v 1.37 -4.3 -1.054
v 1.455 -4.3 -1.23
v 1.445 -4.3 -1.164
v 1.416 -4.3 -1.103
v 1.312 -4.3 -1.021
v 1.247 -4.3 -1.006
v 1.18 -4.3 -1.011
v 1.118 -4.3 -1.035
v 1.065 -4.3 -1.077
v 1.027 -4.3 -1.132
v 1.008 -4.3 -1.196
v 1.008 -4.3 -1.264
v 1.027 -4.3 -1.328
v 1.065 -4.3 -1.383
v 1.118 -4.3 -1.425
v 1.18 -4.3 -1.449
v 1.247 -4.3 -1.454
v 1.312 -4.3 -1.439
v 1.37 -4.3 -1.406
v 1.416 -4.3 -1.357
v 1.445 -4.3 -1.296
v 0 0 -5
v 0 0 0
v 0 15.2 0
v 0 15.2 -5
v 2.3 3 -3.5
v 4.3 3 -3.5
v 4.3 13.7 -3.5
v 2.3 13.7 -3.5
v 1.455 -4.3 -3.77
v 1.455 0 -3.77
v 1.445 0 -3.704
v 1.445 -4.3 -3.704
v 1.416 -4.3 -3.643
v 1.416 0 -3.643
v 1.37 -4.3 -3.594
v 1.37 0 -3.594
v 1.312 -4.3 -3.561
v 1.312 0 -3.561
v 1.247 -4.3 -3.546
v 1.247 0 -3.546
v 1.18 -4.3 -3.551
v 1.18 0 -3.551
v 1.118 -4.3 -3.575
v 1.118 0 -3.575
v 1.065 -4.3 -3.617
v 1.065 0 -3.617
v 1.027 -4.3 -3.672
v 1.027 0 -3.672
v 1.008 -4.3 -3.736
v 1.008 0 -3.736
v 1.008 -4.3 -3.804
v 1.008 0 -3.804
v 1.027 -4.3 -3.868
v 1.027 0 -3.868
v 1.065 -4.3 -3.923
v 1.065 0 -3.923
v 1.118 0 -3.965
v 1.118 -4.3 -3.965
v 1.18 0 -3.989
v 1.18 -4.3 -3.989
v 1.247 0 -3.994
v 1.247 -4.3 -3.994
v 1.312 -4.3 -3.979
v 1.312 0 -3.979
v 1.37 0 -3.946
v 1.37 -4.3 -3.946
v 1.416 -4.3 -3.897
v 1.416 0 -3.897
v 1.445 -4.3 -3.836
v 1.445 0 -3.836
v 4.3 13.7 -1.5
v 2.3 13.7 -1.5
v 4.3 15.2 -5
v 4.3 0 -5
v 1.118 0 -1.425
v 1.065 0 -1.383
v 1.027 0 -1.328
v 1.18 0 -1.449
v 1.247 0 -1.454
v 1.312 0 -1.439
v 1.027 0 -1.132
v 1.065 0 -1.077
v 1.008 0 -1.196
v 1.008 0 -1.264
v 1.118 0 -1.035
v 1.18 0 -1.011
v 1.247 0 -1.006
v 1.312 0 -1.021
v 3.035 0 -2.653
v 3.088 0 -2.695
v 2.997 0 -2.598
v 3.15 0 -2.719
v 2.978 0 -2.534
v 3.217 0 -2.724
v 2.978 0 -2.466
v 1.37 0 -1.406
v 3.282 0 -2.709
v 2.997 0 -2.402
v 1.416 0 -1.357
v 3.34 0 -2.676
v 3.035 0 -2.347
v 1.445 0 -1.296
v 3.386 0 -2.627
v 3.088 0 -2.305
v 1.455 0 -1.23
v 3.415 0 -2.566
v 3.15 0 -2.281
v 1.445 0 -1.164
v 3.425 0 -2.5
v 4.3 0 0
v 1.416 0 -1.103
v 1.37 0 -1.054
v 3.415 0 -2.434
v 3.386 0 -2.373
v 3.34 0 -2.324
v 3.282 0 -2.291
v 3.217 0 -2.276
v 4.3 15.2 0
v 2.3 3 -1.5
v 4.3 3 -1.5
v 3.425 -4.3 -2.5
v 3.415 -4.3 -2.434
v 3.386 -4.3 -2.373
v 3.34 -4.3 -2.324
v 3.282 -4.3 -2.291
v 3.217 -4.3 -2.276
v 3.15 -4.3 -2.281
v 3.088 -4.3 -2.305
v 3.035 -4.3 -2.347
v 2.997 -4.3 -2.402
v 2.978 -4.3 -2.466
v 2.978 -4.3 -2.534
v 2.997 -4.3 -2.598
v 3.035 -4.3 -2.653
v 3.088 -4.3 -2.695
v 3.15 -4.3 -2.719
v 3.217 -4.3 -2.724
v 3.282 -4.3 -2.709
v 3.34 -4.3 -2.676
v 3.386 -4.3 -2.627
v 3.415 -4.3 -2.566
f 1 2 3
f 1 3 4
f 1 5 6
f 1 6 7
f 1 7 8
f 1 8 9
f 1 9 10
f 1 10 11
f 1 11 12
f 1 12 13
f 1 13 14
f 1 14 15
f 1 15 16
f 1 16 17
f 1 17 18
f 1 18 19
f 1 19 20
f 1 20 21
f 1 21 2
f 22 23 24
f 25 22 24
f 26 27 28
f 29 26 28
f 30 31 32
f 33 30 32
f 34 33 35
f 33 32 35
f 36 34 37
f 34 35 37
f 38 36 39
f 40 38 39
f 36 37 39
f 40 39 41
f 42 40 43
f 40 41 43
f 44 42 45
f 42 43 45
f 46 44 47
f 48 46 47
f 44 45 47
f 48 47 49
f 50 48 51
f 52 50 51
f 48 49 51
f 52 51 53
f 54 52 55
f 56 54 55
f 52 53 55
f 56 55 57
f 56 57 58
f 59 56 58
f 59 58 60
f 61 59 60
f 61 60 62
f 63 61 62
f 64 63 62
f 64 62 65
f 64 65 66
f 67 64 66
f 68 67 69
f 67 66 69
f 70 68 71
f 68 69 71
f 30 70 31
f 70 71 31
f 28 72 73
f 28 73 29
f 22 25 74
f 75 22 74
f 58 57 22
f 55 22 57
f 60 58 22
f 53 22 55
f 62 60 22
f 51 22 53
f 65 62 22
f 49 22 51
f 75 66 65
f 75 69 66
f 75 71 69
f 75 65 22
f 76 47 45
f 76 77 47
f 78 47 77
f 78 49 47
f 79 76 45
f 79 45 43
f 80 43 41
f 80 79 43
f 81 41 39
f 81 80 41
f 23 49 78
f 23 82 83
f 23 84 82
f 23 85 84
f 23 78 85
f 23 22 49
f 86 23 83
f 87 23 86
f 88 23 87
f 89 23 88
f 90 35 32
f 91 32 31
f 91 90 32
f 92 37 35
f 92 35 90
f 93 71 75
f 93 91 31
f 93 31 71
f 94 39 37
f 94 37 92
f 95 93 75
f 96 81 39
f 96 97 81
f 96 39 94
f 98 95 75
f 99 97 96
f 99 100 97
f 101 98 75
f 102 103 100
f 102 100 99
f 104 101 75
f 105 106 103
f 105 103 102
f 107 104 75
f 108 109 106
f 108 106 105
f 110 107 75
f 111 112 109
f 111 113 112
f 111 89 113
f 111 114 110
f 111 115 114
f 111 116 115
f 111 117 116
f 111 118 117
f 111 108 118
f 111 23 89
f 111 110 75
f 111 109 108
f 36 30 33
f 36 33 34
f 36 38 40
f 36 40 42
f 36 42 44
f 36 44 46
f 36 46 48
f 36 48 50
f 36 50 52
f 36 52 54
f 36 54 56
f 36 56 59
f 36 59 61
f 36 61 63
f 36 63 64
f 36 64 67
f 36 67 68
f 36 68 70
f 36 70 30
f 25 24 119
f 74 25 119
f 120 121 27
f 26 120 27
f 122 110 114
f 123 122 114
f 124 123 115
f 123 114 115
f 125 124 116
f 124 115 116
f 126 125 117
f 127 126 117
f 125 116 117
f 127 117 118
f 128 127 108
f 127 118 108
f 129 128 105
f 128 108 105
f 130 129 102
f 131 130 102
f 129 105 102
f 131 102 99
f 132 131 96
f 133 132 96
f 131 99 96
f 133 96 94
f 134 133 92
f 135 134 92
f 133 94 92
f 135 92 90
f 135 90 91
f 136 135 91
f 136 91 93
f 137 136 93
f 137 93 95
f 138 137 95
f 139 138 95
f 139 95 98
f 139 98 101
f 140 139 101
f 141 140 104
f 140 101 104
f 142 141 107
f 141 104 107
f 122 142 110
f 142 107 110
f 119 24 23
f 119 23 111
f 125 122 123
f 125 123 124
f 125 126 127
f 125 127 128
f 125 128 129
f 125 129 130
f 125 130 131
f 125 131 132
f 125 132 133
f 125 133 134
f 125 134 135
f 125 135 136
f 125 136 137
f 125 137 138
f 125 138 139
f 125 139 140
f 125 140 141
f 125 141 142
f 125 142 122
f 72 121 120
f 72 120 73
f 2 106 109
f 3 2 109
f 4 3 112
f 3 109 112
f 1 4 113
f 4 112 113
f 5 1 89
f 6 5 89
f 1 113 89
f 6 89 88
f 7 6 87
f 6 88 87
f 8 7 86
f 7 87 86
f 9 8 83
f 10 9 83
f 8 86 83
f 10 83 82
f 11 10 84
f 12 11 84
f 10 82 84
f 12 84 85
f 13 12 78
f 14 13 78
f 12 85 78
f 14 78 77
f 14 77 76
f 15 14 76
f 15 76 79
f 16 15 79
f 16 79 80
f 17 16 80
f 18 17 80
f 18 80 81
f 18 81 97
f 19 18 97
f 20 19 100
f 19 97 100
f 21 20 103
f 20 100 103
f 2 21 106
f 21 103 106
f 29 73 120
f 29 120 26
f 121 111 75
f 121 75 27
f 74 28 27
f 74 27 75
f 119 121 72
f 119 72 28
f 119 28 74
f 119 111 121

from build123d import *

# Parameters (mm, degrees)
SKETCH1_W           = 4.3
SKETCH1_H           = 15.2
BOSS_EXTRUDE1_DEPTH = 5
SKETCH2_W           = 2
SKETCH2_H           = 10.7
CUT_EXTRUDE1_DEPTH  = 2
SKETCH3_R           = 0.225
BOSS_EXTRUDE2_DEPTH = 4.3


with BuildPart() as part:
    # Sketch1 → Boss-Extrude1 (new body)
    with BuildSketch(Plane.XY):
        with Locations((2.15, 7.6)):
            Rectangle(SKETCH1_W, SKETCH1_H)
    extrude(amount=-BOSS_EXTRUDE1_DEPTH)

    # Sketch2 → Cut-Extrude1 (cut)
    with BuildSketch(Plane(origin=(4.3, 0, 0), x_dir=(0, 0, -1), z_dir=(1, 0, 0))):
        with Locations((2.5, 8.35)):
            Rectangle(SKETCH2_W, SKETCH2_H)
    extrude(amount=-CUT_EXTRUDE1_DEPTH, mode=Mode.SUBTRACT)

    # Sketch3 → Boss-Extrude2 (add)
    with BuildSketch(Plane.XZ):
        with Locations((1.23, -1.23)):
            Circle(SKETCH3_R)
        with Locations((1.23, -3.77)):
            Circle(SKETCH3_R)
        with Locations((3.2, -2.5)):
            Circle(SKETCH3_R)
    extrude(amount=BOSS_EXTRUDE2_DEPTH)


solid = part.part
